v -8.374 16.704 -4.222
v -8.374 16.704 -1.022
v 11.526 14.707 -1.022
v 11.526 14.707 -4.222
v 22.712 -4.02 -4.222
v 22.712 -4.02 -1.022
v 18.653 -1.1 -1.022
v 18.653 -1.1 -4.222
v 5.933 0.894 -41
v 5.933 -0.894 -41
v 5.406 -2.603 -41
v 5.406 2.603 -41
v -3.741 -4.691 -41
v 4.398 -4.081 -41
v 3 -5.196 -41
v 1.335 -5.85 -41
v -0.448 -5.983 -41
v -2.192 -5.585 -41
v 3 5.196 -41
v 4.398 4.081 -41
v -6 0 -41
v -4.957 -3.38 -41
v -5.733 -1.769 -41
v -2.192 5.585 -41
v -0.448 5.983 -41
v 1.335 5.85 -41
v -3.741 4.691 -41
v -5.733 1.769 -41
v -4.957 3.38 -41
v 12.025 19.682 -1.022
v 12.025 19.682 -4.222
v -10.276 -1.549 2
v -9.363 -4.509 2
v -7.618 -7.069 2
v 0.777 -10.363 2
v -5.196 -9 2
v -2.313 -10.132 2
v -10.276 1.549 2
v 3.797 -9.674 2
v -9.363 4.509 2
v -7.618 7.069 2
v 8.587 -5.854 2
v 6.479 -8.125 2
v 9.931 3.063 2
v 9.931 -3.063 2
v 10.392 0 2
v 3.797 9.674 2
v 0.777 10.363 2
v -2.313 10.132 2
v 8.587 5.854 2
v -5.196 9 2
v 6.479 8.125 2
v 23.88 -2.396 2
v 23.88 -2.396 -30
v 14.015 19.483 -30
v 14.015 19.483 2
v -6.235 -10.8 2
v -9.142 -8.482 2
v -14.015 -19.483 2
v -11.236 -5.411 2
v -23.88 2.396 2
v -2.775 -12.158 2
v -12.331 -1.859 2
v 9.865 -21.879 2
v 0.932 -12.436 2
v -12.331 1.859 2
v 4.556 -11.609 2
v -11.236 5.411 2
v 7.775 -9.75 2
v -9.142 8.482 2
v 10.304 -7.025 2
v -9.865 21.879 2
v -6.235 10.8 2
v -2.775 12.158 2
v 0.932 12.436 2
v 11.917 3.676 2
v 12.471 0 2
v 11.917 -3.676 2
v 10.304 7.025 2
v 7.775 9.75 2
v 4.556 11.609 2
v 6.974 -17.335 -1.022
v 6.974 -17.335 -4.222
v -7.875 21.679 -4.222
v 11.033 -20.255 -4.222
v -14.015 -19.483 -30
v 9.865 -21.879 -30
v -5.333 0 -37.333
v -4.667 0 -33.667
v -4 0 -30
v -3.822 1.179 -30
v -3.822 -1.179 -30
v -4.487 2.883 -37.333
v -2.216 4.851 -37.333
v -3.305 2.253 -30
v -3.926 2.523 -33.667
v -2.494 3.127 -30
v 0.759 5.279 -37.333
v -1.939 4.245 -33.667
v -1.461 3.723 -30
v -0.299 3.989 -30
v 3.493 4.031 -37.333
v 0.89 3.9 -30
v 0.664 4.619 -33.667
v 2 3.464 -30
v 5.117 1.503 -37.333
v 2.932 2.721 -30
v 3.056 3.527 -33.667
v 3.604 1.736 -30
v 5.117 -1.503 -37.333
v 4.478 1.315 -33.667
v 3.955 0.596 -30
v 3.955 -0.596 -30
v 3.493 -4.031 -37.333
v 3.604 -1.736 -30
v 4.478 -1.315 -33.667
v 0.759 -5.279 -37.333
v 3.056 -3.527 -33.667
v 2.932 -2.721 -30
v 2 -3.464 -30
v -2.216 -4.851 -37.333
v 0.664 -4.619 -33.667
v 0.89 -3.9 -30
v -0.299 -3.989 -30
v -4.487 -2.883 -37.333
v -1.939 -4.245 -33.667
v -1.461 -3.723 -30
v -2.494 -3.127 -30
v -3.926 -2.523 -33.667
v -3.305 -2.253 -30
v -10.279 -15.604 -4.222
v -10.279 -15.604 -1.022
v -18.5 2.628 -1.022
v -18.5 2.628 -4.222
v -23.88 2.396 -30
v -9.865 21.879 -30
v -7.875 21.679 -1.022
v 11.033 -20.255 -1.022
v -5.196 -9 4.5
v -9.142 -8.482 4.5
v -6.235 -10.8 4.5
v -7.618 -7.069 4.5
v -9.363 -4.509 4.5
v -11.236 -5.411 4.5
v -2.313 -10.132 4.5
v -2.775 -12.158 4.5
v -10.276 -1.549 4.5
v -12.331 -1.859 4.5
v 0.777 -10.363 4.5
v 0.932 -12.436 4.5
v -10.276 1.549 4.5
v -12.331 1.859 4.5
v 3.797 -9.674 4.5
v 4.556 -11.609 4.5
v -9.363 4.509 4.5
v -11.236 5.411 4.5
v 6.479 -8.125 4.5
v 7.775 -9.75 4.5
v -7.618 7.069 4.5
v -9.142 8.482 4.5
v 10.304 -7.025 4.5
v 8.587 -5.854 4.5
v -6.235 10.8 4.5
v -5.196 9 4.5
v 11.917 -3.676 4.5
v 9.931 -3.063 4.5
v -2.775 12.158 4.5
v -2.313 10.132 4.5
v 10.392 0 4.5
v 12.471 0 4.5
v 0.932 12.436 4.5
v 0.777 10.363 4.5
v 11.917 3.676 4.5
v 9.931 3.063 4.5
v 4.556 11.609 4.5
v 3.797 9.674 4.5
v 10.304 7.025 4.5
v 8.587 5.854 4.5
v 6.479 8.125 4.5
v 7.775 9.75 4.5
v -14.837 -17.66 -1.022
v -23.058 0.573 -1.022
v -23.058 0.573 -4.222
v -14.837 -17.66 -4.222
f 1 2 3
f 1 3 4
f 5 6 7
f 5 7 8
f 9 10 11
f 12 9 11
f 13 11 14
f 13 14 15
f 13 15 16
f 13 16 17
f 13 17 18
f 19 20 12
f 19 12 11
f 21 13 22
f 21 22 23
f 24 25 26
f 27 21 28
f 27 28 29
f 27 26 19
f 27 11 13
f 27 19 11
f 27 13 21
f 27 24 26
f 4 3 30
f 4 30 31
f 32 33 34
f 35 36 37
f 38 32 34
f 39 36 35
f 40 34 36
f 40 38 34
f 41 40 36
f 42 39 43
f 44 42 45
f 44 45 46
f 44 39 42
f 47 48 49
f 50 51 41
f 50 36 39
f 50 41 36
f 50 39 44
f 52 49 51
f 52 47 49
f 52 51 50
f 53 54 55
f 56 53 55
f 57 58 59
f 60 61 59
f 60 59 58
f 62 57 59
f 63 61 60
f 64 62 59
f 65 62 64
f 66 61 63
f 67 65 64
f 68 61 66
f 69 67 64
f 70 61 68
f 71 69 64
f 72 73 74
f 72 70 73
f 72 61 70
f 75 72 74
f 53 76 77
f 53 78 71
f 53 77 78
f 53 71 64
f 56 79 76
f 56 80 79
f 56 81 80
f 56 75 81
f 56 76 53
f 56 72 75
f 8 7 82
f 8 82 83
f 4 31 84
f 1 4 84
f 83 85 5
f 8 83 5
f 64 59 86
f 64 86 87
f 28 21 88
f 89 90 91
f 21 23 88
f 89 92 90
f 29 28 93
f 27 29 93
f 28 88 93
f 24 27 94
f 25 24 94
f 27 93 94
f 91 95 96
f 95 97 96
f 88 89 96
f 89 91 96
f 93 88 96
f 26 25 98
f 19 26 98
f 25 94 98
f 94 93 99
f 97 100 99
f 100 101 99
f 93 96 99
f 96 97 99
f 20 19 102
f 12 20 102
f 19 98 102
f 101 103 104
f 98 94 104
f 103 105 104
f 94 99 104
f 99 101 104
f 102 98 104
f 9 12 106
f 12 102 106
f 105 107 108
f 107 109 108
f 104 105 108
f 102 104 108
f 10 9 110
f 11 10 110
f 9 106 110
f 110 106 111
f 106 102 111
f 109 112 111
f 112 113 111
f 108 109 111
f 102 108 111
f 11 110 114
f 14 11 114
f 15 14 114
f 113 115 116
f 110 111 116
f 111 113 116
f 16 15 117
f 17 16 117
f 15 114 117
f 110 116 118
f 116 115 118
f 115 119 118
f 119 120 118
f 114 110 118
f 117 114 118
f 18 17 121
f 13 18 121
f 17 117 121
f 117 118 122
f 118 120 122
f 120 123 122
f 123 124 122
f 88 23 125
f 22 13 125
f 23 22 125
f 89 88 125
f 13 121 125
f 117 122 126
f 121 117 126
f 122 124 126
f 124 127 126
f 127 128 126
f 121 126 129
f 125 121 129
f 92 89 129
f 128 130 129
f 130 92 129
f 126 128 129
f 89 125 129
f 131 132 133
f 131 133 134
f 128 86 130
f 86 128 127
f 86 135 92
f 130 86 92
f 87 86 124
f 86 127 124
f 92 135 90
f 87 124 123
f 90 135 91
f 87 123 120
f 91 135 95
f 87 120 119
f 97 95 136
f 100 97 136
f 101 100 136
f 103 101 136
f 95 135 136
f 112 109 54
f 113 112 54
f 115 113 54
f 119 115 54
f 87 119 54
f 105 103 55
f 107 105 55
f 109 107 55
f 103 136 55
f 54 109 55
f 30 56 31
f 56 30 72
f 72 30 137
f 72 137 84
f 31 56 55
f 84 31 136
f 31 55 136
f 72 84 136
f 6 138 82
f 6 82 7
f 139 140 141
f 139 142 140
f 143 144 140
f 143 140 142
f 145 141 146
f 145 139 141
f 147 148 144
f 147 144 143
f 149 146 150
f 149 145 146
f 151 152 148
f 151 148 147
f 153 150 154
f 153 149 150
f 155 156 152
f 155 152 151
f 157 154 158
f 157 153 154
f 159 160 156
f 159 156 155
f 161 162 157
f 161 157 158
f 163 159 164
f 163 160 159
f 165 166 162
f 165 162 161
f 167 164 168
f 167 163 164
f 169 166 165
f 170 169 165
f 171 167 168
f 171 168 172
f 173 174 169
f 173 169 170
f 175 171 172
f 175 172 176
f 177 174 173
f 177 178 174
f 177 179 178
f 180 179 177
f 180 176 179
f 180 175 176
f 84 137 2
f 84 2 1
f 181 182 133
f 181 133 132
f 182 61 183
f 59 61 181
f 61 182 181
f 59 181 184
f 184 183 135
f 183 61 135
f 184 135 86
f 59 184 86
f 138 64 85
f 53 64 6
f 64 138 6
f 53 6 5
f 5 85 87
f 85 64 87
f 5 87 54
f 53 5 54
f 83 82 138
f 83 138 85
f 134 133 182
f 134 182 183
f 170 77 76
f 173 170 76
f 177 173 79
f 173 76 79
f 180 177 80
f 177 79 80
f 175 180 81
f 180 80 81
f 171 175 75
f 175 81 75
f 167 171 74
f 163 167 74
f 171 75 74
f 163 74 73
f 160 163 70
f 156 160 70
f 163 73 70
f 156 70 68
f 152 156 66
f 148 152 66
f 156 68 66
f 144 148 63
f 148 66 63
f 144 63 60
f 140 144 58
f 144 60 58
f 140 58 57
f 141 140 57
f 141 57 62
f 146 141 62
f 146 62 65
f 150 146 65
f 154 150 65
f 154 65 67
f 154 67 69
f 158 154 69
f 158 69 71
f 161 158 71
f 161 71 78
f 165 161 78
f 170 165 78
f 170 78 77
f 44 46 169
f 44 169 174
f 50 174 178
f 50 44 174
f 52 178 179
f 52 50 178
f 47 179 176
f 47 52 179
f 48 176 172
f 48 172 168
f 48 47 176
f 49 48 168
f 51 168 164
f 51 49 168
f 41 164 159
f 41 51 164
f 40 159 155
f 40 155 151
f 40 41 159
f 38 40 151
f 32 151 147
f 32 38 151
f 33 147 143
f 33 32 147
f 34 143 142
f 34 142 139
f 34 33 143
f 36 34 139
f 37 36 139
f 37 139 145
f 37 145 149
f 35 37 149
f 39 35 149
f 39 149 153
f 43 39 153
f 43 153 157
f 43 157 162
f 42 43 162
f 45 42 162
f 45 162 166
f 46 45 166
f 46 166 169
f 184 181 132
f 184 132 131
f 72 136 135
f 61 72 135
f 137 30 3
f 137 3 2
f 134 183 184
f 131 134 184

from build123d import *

# Parameters (mm, degrees)
Y_KSEKLIK_EKSTR_ZYON1_DEPTH      = 2
Y_KSEKLIK_EKSTR_ZYON1_DEPTH_BACK = 30
IZIM1_R                          = 12.470765814
Y_KSEKLIK_EKSTR_ZYON2_DEPTH      = 4.5
Y_KSEKLIK_EKSTR_ZYON2_DEPTH_BACK = 30
IZIM1_3_R                        = 12.470765814
IZIM1_3_R_2                      = 10.392304845
Y_KSEKLIK_EKSTR_ZYON3_DEPTH      = 2
Y_KSEKLIK_EKSTR_ZYON3_DEPTH_BACK = 30
IZIM1_4_R                        = 10.392304845
IZIM4_W                          = 3.2
IZIM4_H                          = 20
KES_EKSTR_ZYON1_DEPTH            = 5
DAIRESEL_KAPLAMA1_COUNT          = 3
IZIM6_R                          = 6
IZIM5_R                          = 4


with BuildPart() as part:
    # Çizim1 → Yükseklik-Ekstrüzyon1 (new, two sides: drawn at the far end of the back side and taken through both)
    with BuildSketch(Plane.XY.offset(-Y_KSEKLIK_EKSTR_ZYON1_DEPTH_BACK)):
        Polygon((-23.880099845, 2.396003215), (-14.015049574, -19.482771503), (9.86505027, -21.878774718), (23.880099845, -2.396003215), (14.015049574, 19.482771503), (-9.86505027, 21.878774718), align=None)
        Circle(IZIM1_R, mode=Mode.SUBTRACT)
    extrude(amount=Y_KSEKLIK_EKSTR_ZYON1_DEPTH + Y_KSEKLIK_EKSTR_ZYON1_DEPTH_BACK)

    # Çizim1<3> → Yükseklik-Ekstrüzyon2 (add, two sides: drawn at the far end of the back side and taken through both)
    with BuildSketch(Plane.XY.offset(-Y_KSEKLIK_EKSTR_ZYON2_DEPTH_BACK)):
        Circle(IZIM1_3_R)
        Circle(IZIM1_3_R_2, mode=Mode.SUBTRACT)
    extrude(amount=Y_KSEKLIK_EKSTR_ZYON2_DEPTH + Y_KSEKLIK_EKSTR_ZYON2_DEPTH_BACK)

    # Çizim1<4> → Yükseklik-Ekstrüzyon3 (add, two sides: drawn at the far end of the back side and taken through both)
    with BuildSketch(Plane.XY.offset(-Y_KSEKLIK_EKSTR_ZYON3_DEPTH_BACK)):
        Circle(IZIM1_4_R)
    extrude(amount=Y_KSEKLIK_EKSTR_ZYON3_DEPTH + Y_KSEKLIK_EKSTR_ZYON3_DEPTH_BACK)

    # Çizim4 → Kes-Ekstrüzyon1 (cut)
    with BuildSketch(Plane(origin=(16.872575058, -12.137388967, 0), x_dir=(0, 0, -1), z_dir=(0.8117821459477176, -0.5839603989317416, 0))):
        with Locations((2.622089109, 0)):
            Rectangle(IZIM4_W, IZIM4_H)
    kes_ekstr_zyon1 = extrude(amount=-KES_EKSTR_ZYON1_DEPTH, mode=Mode.SUBTRACT)

    # Dairesel Kaplama1: Kes-Ekstrüzyon1 ×3 about axis
    dairesel_kaplama1_axis = Axis((0, 0, 0), (0, 0, 1))
    for i in range(1, DAIRESEL_KAPLAMA1_COUNT):
        add(kes_ekstr_zyon1.rotate(dairesel_kaplama1_axis, i * 360 / DAIRESEL_KAPLAMA1_COUNT), mode=Mode.SUBTRACT)

    # Çizim6 → Loft1 section 0
    with BuildSketch(Plane(origin=(0, 0, -41), x_dir=(-1, 0, 0), z_dir=(0, 0, -1))):
        Circle(IZIM6_R)
    # Çizim5 → Loft1 section 1
    with BuildSketch(Plane(origin=(0, 0, -30), x_dir=(-1, 0, 0), z_dir=(0, 0, -1))):
        Circle(IZIM5_R)
    loft()


solid = part.part
